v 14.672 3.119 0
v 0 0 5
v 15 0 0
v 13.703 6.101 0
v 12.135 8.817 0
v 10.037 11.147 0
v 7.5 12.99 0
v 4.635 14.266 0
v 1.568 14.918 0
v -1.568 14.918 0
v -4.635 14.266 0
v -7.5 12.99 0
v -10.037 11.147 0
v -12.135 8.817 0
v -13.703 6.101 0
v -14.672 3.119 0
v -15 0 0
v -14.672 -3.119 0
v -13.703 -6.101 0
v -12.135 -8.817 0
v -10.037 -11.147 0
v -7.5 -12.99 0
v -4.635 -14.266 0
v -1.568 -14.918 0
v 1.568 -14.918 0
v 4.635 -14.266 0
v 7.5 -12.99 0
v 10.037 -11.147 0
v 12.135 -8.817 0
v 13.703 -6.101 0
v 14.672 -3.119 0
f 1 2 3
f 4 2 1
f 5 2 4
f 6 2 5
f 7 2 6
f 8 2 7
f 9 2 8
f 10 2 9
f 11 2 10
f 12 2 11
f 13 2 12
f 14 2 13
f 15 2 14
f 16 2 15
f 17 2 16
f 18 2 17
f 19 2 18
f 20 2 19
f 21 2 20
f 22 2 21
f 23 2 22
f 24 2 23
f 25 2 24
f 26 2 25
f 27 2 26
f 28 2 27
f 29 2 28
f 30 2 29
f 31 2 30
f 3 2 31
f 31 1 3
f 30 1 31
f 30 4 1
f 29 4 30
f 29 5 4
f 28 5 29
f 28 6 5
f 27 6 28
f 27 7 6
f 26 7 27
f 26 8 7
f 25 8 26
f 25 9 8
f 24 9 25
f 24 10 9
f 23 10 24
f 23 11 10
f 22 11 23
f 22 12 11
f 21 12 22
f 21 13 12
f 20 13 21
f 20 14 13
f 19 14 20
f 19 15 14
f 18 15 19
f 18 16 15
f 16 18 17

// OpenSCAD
// Generated by SolidPython 1.0.1 on 2020-07-29 00:39:25


cylinder(h = 5, r1 = 15, r2 = 0);
/***********************************************
*********      SolidPython code:      **********
************************************************
 
# import packages: SolidPython
from solid import *
from solid.utils import *
from itertools import chain, combinations


class Resize:

    def __init__(self, scad_file):
        self.scad_file = scad_file
        #self.scad_file = import_scad(scad_file)
        # cone/cylinder param:
        self.r1 = 0
        self.r2 = 0
        self.h = 0
        # rectangular prism param:
        self.w = 0
        self.l = 0
        # ellipse param:
        self.r = 0

    # import OpenScad code (file name corresponds to shape)


    # classify shape + parameters
    def assign(self, param1, param2, param3):
        if self.scad_file == 'cone.scad':
            self.r1 = param1
            self.r2 = param2
            self.h = param3
        elif self.scad_file == 'cylinder.scad':
            self.r1 = param1
            self.r2 = param2
            self.h = param3
        elif self.scad_file == 'rectangularPrism.scad':
            self.h = param1
            self.l = param2
            self.w = param3
        else:
            self.r = param1
            self.h = param2

    # resize parameters
    def iterate(self):
        x = range(3, 20, 2)
        i = 1
        if self.scad_file == 'cone.scad':
            tempList = list(combinations(x, 2))
            for temp in tempList:
                param1 = temp[0]
                param2 = temp[1]
                filepath = 'produced_scad_files/' + 'cone' + str(param1) + '_' + str(param2) + '_' + '.scad'
                scad_render_to_file(cylinder(h=param1, r1=param2, r2=0), filepath)

        elif self.scad_file == 'cylinder.scad':
            tempList = list(combinations(x, 3))
            for temp in tempList:
                param1 = temp[0]
                param2 = temp[1]
                filepath = 'produced_scad_files/' + 'cylinder' + str(param1) + '_' + str(param2) + '_' + '.scad'
                scad_render_to_file(cylinder(h=param1, r1=param2, r2=param2), filepath)

        elif self.scad_file == 'rectangularPrism.scad':
            tempList = list(combinations(x, 3))
            for temp in tempList:
                param1 = temp[0]
                param2 = temp[1]
                param3 = temp[2]
                filepath = 'produced_scad_files/' + 'rectangularPrism' + str(param1) + '_' + str(param2) + '_' + str(
                    param3) + '.scad'
                scad_render_to_file(cube(size=(param1, param2, param3)), filepath)

        elif self.scad_file == 'ellipse.scad':
            tempList = list(combinations(x, 4))
            for temp in tempList:
                param1 = temp[0]
                param2 = temp[1]
                param3 = temp[2]
                param4 = temp[3]
                filepath = 'produced_scad_files/' + 'ellipse' + str(param1) + '_' + str(param2) + '_' + str(param3) + '_' + str(param4) + '.scad'
                scad_render_to_file(scale([param1, param2, param3])(sphere(r=param4)), filepath)

    def render_to_scadfile(self):
        scad_render_to_file(scad, 'example.scad') 
 
************************************************/
